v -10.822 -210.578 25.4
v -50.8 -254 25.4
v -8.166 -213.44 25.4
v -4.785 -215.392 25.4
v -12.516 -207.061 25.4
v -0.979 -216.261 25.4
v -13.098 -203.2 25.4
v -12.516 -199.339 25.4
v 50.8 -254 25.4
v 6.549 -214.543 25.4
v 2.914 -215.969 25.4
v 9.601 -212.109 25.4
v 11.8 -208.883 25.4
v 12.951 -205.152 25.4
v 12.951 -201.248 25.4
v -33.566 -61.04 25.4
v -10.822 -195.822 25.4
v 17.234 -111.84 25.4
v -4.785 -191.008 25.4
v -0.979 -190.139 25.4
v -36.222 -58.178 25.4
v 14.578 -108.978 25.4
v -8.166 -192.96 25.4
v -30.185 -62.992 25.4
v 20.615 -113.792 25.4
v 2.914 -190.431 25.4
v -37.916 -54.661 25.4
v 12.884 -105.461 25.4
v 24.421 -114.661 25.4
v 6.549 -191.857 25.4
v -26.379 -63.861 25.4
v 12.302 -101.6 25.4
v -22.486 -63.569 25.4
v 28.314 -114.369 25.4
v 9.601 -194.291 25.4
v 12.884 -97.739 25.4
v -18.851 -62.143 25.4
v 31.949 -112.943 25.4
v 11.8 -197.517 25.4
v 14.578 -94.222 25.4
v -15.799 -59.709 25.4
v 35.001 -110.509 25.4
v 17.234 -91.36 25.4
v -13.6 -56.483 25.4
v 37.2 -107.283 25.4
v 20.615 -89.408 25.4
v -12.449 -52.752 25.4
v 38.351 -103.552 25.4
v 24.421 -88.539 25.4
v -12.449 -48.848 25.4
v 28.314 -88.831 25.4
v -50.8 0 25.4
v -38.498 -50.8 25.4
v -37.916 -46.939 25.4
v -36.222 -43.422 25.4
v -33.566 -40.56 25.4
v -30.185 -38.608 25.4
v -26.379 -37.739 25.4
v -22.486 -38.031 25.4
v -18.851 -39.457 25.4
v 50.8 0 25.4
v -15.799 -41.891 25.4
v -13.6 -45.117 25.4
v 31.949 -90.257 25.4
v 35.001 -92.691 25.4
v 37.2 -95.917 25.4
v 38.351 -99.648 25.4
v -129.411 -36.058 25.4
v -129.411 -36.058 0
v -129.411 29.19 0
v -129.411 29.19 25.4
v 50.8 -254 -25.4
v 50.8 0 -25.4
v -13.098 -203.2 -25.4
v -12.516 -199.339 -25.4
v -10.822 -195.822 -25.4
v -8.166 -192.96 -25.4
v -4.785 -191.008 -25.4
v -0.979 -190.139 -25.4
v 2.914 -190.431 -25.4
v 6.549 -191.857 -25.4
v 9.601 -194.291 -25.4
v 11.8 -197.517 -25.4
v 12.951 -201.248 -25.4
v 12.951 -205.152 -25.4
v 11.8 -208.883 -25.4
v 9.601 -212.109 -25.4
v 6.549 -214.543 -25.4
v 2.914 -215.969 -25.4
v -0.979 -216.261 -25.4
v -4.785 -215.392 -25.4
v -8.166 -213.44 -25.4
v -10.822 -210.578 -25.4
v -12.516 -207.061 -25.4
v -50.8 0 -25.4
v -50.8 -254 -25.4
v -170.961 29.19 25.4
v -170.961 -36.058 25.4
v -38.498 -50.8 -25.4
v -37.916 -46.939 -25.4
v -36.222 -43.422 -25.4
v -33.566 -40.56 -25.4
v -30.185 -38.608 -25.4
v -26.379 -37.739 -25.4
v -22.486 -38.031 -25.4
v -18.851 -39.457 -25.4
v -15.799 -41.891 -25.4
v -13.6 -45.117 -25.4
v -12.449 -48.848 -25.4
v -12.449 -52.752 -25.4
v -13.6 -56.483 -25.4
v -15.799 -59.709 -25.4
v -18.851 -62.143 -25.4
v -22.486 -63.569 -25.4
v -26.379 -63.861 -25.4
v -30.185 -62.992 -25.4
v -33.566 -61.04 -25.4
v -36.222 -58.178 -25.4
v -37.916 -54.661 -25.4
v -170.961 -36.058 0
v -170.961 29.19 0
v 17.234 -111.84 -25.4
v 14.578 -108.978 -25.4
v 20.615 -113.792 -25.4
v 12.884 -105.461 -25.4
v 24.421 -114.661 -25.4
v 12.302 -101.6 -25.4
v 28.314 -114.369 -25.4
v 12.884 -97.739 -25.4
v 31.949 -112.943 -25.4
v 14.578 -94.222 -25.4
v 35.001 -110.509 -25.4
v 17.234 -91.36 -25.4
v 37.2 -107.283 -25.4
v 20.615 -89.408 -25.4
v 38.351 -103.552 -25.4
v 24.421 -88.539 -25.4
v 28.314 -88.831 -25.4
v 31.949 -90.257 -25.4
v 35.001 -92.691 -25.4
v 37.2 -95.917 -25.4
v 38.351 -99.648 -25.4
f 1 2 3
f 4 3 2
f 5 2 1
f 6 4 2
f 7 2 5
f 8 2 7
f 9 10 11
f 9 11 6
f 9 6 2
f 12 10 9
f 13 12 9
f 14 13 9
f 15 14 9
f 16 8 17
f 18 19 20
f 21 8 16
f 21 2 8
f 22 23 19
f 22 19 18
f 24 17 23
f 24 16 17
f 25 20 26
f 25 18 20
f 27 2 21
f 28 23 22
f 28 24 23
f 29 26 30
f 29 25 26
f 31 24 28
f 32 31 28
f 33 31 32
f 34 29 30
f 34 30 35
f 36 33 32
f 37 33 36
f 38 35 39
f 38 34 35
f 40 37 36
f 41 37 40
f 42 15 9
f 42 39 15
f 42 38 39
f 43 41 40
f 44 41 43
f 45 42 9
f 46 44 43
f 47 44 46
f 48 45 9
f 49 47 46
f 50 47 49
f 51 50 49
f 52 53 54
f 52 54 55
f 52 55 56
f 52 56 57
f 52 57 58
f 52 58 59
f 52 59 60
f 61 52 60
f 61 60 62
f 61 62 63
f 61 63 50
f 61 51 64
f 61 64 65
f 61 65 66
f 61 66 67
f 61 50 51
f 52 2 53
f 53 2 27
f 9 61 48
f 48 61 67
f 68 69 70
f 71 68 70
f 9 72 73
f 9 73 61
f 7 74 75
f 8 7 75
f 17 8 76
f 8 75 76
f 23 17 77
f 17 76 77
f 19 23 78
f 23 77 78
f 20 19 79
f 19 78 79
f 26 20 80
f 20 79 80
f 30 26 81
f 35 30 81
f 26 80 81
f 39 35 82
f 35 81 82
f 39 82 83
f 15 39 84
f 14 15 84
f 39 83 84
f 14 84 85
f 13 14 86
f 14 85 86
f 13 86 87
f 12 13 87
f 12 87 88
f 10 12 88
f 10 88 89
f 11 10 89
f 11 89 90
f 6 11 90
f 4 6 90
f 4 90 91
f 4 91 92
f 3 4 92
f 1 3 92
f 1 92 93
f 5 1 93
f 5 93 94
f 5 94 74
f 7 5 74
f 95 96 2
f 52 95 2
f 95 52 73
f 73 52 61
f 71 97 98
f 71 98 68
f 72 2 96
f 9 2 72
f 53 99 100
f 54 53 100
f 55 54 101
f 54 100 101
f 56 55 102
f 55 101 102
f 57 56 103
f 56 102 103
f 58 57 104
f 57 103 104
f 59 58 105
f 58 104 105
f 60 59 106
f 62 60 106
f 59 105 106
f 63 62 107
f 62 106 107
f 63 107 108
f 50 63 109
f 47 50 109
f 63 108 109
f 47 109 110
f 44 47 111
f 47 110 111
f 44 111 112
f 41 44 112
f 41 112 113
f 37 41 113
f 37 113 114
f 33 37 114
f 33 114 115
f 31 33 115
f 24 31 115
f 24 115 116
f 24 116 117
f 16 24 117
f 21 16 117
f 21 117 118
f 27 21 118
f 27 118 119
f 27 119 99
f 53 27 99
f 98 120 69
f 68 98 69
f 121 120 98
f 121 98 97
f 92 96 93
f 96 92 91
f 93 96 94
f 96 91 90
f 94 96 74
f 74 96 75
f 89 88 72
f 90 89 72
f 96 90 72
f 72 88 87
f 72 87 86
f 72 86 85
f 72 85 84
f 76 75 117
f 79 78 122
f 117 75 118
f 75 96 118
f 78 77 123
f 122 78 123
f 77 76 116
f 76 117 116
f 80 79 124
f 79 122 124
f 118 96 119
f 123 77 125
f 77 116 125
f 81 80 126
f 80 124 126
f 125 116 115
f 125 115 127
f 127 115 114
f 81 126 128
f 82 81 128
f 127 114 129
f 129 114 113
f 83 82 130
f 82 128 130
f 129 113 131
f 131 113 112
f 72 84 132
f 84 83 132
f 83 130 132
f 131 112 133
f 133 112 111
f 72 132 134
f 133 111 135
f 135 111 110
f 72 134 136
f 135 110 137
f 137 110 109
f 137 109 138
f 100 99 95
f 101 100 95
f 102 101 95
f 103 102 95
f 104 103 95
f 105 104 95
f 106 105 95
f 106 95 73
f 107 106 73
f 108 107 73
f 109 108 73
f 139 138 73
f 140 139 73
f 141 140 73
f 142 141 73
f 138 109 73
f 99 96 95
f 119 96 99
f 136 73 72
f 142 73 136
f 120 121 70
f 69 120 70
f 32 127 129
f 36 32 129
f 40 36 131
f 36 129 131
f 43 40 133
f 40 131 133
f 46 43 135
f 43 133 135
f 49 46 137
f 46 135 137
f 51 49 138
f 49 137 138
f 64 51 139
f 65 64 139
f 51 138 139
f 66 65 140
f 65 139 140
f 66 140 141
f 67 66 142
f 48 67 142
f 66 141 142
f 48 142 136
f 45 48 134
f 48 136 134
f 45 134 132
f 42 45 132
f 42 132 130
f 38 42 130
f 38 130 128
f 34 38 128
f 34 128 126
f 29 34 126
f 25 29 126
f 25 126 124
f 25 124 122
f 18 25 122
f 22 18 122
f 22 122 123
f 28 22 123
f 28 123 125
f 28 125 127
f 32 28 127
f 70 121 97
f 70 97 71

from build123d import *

# Parameters (mm, degrees)
F0_W     = 101.6
F0_H     = 50.8
F1_DEPTH = 254
F2_W     = 41.54984653
F2_H     = 65.2474500239
F3_DEPTH = 25.4
F5_D     = 26.19502


with BuildPart() as f1:
    # F0 (on Front) → F1 (new body)
    with BuildSketch(Plane.XZ):
        Rectangle(F0_W, F0_H)
    extrude(amount=F1_DEPTH)

    # F5 (through all)
    with Locations(Plane.XY.offset(25.4)):
        with Locations((0, -203.2), (25.4, -101.6), (-25.4, -50.8)):
            Hole(F5_D / 2)


with BuildPart() as f3:
    # F2 (on Top) → F3 (new body)
    with BuildSketch(Plane.XY):
        with Locations((-150.1859650016, -3.4338515252)):
            Rectangle(F2_W, F2_H)
    extrude(amount=F3_DEPTH)


solid = Compound([f1.part, f3.part])
